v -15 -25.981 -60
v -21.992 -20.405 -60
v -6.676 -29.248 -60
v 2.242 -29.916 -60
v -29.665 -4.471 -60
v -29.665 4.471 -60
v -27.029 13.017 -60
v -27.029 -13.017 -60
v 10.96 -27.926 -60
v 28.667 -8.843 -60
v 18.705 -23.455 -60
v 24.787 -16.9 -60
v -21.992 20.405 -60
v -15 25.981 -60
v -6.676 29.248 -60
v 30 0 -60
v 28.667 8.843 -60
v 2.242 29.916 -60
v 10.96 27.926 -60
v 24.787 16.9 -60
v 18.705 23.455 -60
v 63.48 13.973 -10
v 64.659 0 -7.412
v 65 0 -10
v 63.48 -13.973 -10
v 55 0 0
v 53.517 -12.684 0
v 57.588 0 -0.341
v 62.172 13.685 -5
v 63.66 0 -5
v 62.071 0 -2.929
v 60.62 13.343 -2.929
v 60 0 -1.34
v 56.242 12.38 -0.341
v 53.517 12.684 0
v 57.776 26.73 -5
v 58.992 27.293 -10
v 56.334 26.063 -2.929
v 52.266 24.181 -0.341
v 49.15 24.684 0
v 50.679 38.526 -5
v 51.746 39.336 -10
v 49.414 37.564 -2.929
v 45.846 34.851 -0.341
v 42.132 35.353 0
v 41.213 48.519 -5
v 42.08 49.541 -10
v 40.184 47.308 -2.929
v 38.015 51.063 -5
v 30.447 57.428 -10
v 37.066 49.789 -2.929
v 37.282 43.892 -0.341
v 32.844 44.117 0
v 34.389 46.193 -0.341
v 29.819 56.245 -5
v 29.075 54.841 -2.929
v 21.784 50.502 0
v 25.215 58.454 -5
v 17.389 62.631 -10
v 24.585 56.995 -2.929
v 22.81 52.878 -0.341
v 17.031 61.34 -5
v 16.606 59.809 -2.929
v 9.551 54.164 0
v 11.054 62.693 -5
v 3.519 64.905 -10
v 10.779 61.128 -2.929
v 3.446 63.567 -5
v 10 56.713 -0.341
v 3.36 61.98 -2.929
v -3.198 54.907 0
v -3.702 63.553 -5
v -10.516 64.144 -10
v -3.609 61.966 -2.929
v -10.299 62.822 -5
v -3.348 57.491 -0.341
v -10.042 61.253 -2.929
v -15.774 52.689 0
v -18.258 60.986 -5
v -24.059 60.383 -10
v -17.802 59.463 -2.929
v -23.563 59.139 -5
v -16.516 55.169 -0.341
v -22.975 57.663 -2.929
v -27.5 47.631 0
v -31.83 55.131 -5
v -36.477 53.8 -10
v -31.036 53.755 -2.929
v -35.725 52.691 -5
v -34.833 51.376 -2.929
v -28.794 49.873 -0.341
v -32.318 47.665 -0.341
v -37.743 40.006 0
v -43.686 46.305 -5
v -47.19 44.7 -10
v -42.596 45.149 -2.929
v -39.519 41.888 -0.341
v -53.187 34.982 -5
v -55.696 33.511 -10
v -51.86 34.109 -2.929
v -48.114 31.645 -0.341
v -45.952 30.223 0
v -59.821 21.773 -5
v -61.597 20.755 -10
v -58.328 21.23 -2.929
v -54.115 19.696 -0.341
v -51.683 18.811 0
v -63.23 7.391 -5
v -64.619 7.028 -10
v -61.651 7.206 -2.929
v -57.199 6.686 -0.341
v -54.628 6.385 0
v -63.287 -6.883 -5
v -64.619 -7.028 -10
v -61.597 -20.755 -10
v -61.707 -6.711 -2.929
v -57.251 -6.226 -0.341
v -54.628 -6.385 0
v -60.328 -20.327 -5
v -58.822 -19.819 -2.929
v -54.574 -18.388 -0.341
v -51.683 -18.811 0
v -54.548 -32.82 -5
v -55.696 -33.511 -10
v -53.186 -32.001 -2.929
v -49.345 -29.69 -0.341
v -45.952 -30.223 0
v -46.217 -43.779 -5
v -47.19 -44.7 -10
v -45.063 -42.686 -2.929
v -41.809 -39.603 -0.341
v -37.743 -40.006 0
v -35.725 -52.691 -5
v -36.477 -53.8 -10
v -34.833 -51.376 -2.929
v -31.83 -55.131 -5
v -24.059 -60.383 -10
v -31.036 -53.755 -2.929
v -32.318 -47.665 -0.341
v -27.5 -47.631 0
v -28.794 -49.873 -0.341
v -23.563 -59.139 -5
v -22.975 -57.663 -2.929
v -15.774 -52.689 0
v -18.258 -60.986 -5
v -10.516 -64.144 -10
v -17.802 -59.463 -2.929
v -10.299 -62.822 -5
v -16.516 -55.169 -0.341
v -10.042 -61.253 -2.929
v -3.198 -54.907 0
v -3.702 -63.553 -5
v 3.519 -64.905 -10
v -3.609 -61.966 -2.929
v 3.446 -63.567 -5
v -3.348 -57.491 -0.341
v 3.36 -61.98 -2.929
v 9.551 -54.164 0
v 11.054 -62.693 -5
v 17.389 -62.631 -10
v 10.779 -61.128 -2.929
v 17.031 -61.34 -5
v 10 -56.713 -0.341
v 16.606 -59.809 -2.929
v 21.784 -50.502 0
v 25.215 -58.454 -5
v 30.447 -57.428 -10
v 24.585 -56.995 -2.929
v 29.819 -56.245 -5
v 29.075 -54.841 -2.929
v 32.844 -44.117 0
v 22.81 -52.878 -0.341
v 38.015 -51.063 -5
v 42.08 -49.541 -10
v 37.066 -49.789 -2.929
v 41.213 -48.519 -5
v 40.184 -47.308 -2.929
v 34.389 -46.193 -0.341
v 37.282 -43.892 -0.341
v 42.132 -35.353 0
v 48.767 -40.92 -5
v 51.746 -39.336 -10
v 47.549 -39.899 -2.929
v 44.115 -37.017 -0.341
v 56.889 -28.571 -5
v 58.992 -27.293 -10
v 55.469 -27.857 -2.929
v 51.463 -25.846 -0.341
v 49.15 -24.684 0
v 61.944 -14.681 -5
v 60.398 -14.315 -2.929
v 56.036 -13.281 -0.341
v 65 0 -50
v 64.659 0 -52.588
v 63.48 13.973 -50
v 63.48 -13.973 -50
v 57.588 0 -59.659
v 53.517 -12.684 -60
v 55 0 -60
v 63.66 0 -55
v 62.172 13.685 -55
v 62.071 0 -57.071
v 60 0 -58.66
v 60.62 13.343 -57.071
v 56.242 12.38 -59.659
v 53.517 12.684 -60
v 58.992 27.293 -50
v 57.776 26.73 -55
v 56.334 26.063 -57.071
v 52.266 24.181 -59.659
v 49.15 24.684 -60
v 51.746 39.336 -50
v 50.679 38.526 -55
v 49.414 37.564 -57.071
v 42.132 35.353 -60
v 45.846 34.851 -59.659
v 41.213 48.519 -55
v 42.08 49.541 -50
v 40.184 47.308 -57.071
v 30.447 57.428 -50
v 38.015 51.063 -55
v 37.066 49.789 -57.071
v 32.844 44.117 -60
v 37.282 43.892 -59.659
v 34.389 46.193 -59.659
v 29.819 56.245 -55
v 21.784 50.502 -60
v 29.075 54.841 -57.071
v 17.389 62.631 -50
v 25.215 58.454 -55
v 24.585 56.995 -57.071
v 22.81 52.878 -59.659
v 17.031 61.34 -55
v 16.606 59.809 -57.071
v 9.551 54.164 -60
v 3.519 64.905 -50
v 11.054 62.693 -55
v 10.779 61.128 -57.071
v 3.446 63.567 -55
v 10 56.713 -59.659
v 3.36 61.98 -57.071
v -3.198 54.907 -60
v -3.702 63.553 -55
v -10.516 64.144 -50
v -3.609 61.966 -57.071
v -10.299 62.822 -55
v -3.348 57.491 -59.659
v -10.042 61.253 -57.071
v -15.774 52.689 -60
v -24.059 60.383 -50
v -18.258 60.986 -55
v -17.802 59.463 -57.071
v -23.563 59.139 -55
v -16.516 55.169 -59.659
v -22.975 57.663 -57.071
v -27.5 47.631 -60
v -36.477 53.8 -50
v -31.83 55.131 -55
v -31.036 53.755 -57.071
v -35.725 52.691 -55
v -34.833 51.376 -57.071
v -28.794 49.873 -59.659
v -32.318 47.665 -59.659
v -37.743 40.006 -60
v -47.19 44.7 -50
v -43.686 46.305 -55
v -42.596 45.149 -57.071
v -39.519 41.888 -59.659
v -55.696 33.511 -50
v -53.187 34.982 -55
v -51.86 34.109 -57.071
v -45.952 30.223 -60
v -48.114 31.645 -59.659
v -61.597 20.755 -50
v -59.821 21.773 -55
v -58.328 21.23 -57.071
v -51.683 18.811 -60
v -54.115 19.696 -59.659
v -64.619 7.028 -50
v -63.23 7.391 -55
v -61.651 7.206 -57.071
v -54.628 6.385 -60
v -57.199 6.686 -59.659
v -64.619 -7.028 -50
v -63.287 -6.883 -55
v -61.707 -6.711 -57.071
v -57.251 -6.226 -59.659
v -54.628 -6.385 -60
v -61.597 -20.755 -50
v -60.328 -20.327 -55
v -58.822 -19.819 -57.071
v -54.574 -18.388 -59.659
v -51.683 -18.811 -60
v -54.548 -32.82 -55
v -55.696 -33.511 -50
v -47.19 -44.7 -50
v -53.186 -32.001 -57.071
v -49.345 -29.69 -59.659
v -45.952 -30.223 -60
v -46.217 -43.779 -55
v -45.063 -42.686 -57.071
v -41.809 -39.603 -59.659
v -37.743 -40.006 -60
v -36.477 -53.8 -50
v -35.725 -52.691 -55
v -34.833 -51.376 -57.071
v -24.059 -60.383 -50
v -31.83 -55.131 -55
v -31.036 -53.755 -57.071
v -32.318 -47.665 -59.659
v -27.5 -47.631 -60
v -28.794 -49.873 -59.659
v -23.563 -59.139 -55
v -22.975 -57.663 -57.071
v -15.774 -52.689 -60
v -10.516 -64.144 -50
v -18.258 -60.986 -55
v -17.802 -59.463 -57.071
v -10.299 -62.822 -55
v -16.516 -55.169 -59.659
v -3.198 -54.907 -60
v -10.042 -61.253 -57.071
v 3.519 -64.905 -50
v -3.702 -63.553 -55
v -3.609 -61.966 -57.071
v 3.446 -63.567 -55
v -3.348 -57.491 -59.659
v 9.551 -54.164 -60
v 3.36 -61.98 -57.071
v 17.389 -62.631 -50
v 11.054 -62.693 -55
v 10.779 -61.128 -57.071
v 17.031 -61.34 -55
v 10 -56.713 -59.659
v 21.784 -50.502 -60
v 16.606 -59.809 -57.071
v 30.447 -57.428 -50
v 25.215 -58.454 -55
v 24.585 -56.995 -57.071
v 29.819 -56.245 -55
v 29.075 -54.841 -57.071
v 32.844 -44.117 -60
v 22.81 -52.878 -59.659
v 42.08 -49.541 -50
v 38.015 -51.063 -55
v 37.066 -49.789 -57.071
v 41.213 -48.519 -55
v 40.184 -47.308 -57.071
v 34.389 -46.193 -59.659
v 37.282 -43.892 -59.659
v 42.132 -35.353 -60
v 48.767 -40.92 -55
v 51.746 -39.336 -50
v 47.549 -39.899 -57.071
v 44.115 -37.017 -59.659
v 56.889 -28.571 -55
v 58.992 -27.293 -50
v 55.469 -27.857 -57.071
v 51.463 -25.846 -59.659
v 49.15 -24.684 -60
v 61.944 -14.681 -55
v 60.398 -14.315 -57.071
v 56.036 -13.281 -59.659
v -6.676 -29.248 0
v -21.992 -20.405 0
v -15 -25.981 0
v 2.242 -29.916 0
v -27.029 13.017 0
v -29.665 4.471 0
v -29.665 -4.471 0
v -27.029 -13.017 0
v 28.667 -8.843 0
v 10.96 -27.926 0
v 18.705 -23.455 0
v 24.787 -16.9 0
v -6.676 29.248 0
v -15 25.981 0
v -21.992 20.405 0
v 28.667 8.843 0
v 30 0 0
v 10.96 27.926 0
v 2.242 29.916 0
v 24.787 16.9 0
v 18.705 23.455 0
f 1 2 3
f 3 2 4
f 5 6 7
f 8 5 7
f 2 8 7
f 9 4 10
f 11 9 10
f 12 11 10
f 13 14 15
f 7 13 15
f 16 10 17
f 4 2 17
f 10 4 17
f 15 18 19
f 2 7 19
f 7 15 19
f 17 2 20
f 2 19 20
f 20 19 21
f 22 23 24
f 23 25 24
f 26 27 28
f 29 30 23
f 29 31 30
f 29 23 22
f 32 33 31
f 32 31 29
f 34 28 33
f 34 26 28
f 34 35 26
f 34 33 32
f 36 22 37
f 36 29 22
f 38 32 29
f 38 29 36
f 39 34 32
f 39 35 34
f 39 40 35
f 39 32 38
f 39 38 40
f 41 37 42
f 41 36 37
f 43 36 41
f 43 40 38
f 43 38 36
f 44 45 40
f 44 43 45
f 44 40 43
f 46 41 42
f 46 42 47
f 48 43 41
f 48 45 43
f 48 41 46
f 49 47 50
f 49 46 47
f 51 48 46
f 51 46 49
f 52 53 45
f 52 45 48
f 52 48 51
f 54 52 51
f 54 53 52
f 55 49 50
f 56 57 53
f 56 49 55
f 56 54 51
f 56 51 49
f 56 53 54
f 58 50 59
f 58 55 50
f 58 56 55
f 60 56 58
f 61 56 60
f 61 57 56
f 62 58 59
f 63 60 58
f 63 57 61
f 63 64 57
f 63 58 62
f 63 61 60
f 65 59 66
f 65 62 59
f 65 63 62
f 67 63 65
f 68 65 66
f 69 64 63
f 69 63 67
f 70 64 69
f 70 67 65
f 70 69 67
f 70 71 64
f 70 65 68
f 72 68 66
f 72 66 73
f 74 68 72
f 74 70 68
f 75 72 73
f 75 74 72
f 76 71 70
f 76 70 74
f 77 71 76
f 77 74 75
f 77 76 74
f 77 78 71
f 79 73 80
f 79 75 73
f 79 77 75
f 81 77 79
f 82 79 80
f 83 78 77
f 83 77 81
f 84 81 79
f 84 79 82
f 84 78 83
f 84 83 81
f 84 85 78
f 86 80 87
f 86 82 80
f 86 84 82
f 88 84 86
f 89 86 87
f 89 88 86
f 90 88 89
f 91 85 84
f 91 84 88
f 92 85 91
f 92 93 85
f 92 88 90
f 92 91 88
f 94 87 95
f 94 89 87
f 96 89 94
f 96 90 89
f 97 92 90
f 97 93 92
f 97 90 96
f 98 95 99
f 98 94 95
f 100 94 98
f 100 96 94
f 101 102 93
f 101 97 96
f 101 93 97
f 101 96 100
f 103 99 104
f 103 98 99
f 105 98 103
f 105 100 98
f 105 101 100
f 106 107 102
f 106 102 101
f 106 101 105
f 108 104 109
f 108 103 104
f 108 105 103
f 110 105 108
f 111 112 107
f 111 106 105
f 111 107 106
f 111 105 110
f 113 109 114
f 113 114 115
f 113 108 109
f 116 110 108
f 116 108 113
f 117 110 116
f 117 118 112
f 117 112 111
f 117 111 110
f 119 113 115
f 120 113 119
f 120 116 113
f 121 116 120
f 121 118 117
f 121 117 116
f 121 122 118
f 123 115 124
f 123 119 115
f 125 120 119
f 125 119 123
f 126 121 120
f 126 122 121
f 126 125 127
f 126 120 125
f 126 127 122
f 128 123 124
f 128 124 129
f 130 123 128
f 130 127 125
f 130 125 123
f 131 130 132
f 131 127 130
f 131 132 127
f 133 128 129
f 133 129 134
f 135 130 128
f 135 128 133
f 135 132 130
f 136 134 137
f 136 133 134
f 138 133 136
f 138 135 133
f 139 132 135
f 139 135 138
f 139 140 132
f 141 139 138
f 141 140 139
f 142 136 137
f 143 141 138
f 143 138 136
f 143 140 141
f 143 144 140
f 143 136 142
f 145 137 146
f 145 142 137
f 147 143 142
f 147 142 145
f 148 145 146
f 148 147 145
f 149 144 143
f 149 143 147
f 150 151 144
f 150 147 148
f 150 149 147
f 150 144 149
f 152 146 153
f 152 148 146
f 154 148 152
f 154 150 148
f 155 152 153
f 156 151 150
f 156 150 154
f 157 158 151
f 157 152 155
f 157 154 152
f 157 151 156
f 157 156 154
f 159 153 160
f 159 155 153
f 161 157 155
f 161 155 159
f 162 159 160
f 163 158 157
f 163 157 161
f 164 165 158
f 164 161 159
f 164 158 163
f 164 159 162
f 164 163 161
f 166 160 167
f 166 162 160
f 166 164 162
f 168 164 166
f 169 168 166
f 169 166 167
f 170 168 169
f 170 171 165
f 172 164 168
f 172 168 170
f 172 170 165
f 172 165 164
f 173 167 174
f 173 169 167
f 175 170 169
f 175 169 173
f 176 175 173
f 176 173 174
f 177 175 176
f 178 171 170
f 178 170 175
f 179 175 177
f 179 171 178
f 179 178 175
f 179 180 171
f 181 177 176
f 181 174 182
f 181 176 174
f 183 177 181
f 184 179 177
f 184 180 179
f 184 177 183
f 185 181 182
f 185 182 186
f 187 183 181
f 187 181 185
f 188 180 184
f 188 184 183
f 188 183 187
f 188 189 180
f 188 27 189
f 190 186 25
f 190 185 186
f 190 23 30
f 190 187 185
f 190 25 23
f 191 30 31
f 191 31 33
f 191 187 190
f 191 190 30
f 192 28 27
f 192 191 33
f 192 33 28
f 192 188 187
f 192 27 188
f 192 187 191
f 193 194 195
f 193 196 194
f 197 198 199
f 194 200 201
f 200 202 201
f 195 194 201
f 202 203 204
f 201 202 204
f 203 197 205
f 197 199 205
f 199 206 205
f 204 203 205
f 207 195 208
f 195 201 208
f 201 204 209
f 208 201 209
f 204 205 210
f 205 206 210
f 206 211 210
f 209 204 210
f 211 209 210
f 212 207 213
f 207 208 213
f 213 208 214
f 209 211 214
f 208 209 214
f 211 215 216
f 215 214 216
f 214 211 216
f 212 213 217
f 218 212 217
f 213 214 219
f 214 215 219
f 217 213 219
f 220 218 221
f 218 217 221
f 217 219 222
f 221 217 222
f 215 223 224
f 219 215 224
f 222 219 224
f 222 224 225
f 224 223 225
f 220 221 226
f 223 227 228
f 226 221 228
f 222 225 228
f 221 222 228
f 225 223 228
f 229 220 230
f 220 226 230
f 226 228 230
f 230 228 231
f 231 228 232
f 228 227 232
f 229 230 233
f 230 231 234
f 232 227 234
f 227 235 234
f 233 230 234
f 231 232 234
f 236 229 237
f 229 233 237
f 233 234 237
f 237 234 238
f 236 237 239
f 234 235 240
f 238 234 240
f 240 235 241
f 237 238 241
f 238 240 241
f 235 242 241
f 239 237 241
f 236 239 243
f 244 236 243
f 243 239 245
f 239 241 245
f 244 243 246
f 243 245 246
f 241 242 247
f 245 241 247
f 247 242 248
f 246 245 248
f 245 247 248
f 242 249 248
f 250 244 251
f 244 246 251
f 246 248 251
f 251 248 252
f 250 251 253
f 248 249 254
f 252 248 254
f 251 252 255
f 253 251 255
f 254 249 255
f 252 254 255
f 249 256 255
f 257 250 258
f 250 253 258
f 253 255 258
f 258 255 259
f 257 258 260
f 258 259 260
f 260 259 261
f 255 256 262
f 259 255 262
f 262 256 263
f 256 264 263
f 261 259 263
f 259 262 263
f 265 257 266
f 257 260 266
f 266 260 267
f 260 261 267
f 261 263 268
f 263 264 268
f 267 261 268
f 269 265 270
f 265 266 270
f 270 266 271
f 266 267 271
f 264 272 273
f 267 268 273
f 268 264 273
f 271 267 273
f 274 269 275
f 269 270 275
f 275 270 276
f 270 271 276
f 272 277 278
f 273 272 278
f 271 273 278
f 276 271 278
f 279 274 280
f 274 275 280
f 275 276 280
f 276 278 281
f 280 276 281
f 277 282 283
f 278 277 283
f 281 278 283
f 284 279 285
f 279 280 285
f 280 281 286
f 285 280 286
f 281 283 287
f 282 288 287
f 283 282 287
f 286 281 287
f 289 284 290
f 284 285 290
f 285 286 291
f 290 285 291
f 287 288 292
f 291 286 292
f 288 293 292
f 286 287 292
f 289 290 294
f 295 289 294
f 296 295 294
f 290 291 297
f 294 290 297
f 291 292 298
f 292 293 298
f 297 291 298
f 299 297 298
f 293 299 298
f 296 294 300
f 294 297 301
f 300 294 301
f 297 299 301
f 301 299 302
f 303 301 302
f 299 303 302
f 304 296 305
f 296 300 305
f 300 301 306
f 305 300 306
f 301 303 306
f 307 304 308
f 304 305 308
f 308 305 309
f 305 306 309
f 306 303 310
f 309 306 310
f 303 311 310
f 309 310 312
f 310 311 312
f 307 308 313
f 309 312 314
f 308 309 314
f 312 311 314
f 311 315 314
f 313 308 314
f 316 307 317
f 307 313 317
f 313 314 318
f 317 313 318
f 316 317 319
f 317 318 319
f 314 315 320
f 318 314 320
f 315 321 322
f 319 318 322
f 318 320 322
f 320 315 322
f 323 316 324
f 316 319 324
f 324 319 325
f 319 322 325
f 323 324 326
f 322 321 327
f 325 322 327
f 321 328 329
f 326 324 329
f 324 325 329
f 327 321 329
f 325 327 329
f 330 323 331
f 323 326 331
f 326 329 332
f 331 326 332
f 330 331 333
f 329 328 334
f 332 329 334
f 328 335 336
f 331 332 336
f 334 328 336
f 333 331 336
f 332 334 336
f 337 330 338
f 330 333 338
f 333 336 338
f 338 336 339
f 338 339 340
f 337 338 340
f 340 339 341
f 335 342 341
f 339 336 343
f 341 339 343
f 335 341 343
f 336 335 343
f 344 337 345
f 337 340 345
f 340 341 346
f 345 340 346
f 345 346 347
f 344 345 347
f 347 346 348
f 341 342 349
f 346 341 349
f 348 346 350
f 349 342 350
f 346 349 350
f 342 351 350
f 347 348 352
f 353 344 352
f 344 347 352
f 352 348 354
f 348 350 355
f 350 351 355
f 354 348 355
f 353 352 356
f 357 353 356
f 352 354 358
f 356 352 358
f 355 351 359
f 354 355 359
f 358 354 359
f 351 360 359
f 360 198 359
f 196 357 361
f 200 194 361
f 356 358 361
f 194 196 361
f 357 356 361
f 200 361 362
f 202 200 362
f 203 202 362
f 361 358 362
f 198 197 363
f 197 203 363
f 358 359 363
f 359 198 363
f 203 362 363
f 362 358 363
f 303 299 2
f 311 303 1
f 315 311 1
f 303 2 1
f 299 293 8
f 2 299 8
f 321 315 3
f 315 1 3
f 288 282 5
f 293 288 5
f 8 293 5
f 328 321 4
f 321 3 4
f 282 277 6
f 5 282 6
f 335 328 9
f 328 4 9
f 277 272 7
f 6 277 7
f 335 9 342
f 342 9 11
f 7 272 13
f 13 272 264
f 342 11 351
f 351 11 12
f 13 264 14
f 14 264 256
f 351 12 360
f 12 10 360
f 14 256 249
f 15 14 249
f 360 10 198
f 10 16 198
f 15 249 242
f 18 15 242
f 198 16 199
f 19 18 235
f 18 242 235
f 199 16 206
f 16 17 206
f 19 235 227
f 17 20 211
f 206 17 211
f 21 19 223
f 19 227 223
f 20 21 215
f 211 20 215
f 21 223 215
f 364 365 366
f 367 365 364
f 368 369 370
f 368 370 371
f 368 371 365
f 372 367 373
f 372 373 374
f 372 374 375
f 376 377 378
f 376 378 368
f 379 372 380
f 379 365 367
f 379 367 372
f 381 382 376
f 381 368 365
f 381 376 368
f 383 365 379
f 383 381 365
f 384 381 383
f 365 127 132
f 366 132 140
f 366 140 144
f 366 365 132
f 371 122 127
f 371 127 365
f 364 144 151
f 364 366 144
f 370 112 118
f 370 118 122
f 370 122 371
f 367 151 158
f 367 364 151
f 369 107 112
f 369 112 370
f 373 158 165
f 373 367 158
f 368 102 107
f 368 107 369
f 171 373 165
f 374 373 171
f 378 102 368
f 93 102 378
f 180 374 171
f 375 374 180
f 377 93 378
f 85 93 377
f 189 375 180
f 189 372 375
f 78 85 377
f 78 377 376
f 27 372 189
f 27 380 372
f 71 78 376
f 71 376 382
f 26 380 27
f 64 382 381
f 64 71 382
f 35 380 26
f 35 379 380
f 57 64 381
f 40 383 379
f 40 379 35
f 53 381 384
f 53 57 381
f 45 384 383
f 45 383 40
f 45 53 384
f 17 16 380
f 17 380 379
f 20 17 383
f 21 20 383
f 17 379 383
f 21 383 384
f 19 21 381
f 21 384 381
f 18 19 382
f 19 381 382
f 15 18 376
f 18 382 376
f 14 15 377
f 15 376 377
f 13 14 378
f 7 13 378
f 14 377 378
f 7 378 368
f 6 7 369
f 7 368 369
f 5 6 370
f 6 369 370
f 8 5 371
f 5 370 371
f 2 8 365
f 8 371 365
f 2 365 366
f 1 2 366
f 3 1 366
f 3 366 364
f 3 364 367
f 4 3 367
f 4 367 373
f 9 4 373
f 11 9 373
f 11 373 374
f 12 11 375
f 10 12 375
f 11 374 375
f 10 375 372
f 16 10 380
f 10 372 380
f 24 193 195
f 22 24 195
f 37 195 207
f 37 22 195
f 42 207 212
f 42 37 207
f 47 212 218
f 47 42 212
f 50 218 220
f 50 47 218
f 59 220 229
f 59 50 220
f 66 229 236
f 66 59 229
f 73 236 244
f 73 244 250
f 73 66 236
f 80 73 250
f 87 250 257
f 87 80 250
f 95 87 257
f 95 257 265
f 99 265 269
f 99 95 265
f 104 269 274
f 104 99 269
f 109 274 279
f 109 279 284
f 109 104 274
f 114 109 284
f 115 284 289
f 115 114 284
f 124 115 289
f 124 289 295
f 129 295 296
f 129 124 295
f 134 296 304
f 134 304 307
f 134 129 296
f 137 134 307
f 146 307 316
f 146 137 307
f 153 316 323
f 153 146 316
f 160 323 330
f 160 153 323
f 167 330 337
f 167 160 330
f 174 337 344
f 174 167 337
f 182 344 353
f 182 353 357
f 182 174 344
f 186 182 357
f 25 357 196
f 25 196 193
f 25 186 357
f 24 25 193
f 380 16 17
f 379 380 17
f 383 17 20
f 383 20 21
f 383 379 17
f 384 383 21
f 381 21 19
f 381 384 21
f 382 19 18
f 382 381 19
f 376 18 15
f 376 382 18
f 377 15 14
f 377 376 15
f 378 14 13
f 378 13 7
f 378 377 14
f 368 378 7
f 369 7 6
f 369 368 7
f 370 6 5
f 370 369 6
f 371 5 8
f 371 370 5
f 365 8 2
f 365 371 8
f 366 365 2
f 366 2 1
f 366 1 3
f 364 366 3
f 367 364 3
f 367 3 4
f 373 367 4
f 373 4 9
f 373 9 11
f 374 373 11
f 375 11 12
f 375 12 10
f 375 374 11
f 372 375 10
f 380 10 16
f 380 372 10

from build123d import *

# Parameters (mm, degrees)
SKETCH1_R           = 65
SKETCH1_R_2         = 30
BOSS_EXTRUDE1_DEPTH = 60
FILLET1_R           = 10
SKETCH2_R           = 30
BOSS_EXTRUDE3_DEPTH = 60


with BuildPart() as part:
    # Sketch1 → Boss-Extrude1 (new body)
    with BuildSketch(Plane.XY):
        Circle(SKETCH1_R)
        Circle(SKETCH1_R_2, mode=Mode.SUBTRACT)
    extrude(amount=-BOSS_EXTRUDE1_DEPTH)

    # Fillet1
    fillet1_edges = [part.edges().sort_by_distance(p)[0] for p in [
        (-65, 0, 0),
        (-65, 0, -60),
    ]]
    fillet(fillet1_edges, radius=FILLET1_R)


with BuildPart() as body_2:
    # Sketch2 → Boss-Extrude3 (new body)
    with BuildSketch(Plane.XY):
        Circle(SKETCH2_R)
    extrude(amount=-BOSS_EXTRUDE3_DEPTH)


solid = Compound([part.part, body_2.part])
